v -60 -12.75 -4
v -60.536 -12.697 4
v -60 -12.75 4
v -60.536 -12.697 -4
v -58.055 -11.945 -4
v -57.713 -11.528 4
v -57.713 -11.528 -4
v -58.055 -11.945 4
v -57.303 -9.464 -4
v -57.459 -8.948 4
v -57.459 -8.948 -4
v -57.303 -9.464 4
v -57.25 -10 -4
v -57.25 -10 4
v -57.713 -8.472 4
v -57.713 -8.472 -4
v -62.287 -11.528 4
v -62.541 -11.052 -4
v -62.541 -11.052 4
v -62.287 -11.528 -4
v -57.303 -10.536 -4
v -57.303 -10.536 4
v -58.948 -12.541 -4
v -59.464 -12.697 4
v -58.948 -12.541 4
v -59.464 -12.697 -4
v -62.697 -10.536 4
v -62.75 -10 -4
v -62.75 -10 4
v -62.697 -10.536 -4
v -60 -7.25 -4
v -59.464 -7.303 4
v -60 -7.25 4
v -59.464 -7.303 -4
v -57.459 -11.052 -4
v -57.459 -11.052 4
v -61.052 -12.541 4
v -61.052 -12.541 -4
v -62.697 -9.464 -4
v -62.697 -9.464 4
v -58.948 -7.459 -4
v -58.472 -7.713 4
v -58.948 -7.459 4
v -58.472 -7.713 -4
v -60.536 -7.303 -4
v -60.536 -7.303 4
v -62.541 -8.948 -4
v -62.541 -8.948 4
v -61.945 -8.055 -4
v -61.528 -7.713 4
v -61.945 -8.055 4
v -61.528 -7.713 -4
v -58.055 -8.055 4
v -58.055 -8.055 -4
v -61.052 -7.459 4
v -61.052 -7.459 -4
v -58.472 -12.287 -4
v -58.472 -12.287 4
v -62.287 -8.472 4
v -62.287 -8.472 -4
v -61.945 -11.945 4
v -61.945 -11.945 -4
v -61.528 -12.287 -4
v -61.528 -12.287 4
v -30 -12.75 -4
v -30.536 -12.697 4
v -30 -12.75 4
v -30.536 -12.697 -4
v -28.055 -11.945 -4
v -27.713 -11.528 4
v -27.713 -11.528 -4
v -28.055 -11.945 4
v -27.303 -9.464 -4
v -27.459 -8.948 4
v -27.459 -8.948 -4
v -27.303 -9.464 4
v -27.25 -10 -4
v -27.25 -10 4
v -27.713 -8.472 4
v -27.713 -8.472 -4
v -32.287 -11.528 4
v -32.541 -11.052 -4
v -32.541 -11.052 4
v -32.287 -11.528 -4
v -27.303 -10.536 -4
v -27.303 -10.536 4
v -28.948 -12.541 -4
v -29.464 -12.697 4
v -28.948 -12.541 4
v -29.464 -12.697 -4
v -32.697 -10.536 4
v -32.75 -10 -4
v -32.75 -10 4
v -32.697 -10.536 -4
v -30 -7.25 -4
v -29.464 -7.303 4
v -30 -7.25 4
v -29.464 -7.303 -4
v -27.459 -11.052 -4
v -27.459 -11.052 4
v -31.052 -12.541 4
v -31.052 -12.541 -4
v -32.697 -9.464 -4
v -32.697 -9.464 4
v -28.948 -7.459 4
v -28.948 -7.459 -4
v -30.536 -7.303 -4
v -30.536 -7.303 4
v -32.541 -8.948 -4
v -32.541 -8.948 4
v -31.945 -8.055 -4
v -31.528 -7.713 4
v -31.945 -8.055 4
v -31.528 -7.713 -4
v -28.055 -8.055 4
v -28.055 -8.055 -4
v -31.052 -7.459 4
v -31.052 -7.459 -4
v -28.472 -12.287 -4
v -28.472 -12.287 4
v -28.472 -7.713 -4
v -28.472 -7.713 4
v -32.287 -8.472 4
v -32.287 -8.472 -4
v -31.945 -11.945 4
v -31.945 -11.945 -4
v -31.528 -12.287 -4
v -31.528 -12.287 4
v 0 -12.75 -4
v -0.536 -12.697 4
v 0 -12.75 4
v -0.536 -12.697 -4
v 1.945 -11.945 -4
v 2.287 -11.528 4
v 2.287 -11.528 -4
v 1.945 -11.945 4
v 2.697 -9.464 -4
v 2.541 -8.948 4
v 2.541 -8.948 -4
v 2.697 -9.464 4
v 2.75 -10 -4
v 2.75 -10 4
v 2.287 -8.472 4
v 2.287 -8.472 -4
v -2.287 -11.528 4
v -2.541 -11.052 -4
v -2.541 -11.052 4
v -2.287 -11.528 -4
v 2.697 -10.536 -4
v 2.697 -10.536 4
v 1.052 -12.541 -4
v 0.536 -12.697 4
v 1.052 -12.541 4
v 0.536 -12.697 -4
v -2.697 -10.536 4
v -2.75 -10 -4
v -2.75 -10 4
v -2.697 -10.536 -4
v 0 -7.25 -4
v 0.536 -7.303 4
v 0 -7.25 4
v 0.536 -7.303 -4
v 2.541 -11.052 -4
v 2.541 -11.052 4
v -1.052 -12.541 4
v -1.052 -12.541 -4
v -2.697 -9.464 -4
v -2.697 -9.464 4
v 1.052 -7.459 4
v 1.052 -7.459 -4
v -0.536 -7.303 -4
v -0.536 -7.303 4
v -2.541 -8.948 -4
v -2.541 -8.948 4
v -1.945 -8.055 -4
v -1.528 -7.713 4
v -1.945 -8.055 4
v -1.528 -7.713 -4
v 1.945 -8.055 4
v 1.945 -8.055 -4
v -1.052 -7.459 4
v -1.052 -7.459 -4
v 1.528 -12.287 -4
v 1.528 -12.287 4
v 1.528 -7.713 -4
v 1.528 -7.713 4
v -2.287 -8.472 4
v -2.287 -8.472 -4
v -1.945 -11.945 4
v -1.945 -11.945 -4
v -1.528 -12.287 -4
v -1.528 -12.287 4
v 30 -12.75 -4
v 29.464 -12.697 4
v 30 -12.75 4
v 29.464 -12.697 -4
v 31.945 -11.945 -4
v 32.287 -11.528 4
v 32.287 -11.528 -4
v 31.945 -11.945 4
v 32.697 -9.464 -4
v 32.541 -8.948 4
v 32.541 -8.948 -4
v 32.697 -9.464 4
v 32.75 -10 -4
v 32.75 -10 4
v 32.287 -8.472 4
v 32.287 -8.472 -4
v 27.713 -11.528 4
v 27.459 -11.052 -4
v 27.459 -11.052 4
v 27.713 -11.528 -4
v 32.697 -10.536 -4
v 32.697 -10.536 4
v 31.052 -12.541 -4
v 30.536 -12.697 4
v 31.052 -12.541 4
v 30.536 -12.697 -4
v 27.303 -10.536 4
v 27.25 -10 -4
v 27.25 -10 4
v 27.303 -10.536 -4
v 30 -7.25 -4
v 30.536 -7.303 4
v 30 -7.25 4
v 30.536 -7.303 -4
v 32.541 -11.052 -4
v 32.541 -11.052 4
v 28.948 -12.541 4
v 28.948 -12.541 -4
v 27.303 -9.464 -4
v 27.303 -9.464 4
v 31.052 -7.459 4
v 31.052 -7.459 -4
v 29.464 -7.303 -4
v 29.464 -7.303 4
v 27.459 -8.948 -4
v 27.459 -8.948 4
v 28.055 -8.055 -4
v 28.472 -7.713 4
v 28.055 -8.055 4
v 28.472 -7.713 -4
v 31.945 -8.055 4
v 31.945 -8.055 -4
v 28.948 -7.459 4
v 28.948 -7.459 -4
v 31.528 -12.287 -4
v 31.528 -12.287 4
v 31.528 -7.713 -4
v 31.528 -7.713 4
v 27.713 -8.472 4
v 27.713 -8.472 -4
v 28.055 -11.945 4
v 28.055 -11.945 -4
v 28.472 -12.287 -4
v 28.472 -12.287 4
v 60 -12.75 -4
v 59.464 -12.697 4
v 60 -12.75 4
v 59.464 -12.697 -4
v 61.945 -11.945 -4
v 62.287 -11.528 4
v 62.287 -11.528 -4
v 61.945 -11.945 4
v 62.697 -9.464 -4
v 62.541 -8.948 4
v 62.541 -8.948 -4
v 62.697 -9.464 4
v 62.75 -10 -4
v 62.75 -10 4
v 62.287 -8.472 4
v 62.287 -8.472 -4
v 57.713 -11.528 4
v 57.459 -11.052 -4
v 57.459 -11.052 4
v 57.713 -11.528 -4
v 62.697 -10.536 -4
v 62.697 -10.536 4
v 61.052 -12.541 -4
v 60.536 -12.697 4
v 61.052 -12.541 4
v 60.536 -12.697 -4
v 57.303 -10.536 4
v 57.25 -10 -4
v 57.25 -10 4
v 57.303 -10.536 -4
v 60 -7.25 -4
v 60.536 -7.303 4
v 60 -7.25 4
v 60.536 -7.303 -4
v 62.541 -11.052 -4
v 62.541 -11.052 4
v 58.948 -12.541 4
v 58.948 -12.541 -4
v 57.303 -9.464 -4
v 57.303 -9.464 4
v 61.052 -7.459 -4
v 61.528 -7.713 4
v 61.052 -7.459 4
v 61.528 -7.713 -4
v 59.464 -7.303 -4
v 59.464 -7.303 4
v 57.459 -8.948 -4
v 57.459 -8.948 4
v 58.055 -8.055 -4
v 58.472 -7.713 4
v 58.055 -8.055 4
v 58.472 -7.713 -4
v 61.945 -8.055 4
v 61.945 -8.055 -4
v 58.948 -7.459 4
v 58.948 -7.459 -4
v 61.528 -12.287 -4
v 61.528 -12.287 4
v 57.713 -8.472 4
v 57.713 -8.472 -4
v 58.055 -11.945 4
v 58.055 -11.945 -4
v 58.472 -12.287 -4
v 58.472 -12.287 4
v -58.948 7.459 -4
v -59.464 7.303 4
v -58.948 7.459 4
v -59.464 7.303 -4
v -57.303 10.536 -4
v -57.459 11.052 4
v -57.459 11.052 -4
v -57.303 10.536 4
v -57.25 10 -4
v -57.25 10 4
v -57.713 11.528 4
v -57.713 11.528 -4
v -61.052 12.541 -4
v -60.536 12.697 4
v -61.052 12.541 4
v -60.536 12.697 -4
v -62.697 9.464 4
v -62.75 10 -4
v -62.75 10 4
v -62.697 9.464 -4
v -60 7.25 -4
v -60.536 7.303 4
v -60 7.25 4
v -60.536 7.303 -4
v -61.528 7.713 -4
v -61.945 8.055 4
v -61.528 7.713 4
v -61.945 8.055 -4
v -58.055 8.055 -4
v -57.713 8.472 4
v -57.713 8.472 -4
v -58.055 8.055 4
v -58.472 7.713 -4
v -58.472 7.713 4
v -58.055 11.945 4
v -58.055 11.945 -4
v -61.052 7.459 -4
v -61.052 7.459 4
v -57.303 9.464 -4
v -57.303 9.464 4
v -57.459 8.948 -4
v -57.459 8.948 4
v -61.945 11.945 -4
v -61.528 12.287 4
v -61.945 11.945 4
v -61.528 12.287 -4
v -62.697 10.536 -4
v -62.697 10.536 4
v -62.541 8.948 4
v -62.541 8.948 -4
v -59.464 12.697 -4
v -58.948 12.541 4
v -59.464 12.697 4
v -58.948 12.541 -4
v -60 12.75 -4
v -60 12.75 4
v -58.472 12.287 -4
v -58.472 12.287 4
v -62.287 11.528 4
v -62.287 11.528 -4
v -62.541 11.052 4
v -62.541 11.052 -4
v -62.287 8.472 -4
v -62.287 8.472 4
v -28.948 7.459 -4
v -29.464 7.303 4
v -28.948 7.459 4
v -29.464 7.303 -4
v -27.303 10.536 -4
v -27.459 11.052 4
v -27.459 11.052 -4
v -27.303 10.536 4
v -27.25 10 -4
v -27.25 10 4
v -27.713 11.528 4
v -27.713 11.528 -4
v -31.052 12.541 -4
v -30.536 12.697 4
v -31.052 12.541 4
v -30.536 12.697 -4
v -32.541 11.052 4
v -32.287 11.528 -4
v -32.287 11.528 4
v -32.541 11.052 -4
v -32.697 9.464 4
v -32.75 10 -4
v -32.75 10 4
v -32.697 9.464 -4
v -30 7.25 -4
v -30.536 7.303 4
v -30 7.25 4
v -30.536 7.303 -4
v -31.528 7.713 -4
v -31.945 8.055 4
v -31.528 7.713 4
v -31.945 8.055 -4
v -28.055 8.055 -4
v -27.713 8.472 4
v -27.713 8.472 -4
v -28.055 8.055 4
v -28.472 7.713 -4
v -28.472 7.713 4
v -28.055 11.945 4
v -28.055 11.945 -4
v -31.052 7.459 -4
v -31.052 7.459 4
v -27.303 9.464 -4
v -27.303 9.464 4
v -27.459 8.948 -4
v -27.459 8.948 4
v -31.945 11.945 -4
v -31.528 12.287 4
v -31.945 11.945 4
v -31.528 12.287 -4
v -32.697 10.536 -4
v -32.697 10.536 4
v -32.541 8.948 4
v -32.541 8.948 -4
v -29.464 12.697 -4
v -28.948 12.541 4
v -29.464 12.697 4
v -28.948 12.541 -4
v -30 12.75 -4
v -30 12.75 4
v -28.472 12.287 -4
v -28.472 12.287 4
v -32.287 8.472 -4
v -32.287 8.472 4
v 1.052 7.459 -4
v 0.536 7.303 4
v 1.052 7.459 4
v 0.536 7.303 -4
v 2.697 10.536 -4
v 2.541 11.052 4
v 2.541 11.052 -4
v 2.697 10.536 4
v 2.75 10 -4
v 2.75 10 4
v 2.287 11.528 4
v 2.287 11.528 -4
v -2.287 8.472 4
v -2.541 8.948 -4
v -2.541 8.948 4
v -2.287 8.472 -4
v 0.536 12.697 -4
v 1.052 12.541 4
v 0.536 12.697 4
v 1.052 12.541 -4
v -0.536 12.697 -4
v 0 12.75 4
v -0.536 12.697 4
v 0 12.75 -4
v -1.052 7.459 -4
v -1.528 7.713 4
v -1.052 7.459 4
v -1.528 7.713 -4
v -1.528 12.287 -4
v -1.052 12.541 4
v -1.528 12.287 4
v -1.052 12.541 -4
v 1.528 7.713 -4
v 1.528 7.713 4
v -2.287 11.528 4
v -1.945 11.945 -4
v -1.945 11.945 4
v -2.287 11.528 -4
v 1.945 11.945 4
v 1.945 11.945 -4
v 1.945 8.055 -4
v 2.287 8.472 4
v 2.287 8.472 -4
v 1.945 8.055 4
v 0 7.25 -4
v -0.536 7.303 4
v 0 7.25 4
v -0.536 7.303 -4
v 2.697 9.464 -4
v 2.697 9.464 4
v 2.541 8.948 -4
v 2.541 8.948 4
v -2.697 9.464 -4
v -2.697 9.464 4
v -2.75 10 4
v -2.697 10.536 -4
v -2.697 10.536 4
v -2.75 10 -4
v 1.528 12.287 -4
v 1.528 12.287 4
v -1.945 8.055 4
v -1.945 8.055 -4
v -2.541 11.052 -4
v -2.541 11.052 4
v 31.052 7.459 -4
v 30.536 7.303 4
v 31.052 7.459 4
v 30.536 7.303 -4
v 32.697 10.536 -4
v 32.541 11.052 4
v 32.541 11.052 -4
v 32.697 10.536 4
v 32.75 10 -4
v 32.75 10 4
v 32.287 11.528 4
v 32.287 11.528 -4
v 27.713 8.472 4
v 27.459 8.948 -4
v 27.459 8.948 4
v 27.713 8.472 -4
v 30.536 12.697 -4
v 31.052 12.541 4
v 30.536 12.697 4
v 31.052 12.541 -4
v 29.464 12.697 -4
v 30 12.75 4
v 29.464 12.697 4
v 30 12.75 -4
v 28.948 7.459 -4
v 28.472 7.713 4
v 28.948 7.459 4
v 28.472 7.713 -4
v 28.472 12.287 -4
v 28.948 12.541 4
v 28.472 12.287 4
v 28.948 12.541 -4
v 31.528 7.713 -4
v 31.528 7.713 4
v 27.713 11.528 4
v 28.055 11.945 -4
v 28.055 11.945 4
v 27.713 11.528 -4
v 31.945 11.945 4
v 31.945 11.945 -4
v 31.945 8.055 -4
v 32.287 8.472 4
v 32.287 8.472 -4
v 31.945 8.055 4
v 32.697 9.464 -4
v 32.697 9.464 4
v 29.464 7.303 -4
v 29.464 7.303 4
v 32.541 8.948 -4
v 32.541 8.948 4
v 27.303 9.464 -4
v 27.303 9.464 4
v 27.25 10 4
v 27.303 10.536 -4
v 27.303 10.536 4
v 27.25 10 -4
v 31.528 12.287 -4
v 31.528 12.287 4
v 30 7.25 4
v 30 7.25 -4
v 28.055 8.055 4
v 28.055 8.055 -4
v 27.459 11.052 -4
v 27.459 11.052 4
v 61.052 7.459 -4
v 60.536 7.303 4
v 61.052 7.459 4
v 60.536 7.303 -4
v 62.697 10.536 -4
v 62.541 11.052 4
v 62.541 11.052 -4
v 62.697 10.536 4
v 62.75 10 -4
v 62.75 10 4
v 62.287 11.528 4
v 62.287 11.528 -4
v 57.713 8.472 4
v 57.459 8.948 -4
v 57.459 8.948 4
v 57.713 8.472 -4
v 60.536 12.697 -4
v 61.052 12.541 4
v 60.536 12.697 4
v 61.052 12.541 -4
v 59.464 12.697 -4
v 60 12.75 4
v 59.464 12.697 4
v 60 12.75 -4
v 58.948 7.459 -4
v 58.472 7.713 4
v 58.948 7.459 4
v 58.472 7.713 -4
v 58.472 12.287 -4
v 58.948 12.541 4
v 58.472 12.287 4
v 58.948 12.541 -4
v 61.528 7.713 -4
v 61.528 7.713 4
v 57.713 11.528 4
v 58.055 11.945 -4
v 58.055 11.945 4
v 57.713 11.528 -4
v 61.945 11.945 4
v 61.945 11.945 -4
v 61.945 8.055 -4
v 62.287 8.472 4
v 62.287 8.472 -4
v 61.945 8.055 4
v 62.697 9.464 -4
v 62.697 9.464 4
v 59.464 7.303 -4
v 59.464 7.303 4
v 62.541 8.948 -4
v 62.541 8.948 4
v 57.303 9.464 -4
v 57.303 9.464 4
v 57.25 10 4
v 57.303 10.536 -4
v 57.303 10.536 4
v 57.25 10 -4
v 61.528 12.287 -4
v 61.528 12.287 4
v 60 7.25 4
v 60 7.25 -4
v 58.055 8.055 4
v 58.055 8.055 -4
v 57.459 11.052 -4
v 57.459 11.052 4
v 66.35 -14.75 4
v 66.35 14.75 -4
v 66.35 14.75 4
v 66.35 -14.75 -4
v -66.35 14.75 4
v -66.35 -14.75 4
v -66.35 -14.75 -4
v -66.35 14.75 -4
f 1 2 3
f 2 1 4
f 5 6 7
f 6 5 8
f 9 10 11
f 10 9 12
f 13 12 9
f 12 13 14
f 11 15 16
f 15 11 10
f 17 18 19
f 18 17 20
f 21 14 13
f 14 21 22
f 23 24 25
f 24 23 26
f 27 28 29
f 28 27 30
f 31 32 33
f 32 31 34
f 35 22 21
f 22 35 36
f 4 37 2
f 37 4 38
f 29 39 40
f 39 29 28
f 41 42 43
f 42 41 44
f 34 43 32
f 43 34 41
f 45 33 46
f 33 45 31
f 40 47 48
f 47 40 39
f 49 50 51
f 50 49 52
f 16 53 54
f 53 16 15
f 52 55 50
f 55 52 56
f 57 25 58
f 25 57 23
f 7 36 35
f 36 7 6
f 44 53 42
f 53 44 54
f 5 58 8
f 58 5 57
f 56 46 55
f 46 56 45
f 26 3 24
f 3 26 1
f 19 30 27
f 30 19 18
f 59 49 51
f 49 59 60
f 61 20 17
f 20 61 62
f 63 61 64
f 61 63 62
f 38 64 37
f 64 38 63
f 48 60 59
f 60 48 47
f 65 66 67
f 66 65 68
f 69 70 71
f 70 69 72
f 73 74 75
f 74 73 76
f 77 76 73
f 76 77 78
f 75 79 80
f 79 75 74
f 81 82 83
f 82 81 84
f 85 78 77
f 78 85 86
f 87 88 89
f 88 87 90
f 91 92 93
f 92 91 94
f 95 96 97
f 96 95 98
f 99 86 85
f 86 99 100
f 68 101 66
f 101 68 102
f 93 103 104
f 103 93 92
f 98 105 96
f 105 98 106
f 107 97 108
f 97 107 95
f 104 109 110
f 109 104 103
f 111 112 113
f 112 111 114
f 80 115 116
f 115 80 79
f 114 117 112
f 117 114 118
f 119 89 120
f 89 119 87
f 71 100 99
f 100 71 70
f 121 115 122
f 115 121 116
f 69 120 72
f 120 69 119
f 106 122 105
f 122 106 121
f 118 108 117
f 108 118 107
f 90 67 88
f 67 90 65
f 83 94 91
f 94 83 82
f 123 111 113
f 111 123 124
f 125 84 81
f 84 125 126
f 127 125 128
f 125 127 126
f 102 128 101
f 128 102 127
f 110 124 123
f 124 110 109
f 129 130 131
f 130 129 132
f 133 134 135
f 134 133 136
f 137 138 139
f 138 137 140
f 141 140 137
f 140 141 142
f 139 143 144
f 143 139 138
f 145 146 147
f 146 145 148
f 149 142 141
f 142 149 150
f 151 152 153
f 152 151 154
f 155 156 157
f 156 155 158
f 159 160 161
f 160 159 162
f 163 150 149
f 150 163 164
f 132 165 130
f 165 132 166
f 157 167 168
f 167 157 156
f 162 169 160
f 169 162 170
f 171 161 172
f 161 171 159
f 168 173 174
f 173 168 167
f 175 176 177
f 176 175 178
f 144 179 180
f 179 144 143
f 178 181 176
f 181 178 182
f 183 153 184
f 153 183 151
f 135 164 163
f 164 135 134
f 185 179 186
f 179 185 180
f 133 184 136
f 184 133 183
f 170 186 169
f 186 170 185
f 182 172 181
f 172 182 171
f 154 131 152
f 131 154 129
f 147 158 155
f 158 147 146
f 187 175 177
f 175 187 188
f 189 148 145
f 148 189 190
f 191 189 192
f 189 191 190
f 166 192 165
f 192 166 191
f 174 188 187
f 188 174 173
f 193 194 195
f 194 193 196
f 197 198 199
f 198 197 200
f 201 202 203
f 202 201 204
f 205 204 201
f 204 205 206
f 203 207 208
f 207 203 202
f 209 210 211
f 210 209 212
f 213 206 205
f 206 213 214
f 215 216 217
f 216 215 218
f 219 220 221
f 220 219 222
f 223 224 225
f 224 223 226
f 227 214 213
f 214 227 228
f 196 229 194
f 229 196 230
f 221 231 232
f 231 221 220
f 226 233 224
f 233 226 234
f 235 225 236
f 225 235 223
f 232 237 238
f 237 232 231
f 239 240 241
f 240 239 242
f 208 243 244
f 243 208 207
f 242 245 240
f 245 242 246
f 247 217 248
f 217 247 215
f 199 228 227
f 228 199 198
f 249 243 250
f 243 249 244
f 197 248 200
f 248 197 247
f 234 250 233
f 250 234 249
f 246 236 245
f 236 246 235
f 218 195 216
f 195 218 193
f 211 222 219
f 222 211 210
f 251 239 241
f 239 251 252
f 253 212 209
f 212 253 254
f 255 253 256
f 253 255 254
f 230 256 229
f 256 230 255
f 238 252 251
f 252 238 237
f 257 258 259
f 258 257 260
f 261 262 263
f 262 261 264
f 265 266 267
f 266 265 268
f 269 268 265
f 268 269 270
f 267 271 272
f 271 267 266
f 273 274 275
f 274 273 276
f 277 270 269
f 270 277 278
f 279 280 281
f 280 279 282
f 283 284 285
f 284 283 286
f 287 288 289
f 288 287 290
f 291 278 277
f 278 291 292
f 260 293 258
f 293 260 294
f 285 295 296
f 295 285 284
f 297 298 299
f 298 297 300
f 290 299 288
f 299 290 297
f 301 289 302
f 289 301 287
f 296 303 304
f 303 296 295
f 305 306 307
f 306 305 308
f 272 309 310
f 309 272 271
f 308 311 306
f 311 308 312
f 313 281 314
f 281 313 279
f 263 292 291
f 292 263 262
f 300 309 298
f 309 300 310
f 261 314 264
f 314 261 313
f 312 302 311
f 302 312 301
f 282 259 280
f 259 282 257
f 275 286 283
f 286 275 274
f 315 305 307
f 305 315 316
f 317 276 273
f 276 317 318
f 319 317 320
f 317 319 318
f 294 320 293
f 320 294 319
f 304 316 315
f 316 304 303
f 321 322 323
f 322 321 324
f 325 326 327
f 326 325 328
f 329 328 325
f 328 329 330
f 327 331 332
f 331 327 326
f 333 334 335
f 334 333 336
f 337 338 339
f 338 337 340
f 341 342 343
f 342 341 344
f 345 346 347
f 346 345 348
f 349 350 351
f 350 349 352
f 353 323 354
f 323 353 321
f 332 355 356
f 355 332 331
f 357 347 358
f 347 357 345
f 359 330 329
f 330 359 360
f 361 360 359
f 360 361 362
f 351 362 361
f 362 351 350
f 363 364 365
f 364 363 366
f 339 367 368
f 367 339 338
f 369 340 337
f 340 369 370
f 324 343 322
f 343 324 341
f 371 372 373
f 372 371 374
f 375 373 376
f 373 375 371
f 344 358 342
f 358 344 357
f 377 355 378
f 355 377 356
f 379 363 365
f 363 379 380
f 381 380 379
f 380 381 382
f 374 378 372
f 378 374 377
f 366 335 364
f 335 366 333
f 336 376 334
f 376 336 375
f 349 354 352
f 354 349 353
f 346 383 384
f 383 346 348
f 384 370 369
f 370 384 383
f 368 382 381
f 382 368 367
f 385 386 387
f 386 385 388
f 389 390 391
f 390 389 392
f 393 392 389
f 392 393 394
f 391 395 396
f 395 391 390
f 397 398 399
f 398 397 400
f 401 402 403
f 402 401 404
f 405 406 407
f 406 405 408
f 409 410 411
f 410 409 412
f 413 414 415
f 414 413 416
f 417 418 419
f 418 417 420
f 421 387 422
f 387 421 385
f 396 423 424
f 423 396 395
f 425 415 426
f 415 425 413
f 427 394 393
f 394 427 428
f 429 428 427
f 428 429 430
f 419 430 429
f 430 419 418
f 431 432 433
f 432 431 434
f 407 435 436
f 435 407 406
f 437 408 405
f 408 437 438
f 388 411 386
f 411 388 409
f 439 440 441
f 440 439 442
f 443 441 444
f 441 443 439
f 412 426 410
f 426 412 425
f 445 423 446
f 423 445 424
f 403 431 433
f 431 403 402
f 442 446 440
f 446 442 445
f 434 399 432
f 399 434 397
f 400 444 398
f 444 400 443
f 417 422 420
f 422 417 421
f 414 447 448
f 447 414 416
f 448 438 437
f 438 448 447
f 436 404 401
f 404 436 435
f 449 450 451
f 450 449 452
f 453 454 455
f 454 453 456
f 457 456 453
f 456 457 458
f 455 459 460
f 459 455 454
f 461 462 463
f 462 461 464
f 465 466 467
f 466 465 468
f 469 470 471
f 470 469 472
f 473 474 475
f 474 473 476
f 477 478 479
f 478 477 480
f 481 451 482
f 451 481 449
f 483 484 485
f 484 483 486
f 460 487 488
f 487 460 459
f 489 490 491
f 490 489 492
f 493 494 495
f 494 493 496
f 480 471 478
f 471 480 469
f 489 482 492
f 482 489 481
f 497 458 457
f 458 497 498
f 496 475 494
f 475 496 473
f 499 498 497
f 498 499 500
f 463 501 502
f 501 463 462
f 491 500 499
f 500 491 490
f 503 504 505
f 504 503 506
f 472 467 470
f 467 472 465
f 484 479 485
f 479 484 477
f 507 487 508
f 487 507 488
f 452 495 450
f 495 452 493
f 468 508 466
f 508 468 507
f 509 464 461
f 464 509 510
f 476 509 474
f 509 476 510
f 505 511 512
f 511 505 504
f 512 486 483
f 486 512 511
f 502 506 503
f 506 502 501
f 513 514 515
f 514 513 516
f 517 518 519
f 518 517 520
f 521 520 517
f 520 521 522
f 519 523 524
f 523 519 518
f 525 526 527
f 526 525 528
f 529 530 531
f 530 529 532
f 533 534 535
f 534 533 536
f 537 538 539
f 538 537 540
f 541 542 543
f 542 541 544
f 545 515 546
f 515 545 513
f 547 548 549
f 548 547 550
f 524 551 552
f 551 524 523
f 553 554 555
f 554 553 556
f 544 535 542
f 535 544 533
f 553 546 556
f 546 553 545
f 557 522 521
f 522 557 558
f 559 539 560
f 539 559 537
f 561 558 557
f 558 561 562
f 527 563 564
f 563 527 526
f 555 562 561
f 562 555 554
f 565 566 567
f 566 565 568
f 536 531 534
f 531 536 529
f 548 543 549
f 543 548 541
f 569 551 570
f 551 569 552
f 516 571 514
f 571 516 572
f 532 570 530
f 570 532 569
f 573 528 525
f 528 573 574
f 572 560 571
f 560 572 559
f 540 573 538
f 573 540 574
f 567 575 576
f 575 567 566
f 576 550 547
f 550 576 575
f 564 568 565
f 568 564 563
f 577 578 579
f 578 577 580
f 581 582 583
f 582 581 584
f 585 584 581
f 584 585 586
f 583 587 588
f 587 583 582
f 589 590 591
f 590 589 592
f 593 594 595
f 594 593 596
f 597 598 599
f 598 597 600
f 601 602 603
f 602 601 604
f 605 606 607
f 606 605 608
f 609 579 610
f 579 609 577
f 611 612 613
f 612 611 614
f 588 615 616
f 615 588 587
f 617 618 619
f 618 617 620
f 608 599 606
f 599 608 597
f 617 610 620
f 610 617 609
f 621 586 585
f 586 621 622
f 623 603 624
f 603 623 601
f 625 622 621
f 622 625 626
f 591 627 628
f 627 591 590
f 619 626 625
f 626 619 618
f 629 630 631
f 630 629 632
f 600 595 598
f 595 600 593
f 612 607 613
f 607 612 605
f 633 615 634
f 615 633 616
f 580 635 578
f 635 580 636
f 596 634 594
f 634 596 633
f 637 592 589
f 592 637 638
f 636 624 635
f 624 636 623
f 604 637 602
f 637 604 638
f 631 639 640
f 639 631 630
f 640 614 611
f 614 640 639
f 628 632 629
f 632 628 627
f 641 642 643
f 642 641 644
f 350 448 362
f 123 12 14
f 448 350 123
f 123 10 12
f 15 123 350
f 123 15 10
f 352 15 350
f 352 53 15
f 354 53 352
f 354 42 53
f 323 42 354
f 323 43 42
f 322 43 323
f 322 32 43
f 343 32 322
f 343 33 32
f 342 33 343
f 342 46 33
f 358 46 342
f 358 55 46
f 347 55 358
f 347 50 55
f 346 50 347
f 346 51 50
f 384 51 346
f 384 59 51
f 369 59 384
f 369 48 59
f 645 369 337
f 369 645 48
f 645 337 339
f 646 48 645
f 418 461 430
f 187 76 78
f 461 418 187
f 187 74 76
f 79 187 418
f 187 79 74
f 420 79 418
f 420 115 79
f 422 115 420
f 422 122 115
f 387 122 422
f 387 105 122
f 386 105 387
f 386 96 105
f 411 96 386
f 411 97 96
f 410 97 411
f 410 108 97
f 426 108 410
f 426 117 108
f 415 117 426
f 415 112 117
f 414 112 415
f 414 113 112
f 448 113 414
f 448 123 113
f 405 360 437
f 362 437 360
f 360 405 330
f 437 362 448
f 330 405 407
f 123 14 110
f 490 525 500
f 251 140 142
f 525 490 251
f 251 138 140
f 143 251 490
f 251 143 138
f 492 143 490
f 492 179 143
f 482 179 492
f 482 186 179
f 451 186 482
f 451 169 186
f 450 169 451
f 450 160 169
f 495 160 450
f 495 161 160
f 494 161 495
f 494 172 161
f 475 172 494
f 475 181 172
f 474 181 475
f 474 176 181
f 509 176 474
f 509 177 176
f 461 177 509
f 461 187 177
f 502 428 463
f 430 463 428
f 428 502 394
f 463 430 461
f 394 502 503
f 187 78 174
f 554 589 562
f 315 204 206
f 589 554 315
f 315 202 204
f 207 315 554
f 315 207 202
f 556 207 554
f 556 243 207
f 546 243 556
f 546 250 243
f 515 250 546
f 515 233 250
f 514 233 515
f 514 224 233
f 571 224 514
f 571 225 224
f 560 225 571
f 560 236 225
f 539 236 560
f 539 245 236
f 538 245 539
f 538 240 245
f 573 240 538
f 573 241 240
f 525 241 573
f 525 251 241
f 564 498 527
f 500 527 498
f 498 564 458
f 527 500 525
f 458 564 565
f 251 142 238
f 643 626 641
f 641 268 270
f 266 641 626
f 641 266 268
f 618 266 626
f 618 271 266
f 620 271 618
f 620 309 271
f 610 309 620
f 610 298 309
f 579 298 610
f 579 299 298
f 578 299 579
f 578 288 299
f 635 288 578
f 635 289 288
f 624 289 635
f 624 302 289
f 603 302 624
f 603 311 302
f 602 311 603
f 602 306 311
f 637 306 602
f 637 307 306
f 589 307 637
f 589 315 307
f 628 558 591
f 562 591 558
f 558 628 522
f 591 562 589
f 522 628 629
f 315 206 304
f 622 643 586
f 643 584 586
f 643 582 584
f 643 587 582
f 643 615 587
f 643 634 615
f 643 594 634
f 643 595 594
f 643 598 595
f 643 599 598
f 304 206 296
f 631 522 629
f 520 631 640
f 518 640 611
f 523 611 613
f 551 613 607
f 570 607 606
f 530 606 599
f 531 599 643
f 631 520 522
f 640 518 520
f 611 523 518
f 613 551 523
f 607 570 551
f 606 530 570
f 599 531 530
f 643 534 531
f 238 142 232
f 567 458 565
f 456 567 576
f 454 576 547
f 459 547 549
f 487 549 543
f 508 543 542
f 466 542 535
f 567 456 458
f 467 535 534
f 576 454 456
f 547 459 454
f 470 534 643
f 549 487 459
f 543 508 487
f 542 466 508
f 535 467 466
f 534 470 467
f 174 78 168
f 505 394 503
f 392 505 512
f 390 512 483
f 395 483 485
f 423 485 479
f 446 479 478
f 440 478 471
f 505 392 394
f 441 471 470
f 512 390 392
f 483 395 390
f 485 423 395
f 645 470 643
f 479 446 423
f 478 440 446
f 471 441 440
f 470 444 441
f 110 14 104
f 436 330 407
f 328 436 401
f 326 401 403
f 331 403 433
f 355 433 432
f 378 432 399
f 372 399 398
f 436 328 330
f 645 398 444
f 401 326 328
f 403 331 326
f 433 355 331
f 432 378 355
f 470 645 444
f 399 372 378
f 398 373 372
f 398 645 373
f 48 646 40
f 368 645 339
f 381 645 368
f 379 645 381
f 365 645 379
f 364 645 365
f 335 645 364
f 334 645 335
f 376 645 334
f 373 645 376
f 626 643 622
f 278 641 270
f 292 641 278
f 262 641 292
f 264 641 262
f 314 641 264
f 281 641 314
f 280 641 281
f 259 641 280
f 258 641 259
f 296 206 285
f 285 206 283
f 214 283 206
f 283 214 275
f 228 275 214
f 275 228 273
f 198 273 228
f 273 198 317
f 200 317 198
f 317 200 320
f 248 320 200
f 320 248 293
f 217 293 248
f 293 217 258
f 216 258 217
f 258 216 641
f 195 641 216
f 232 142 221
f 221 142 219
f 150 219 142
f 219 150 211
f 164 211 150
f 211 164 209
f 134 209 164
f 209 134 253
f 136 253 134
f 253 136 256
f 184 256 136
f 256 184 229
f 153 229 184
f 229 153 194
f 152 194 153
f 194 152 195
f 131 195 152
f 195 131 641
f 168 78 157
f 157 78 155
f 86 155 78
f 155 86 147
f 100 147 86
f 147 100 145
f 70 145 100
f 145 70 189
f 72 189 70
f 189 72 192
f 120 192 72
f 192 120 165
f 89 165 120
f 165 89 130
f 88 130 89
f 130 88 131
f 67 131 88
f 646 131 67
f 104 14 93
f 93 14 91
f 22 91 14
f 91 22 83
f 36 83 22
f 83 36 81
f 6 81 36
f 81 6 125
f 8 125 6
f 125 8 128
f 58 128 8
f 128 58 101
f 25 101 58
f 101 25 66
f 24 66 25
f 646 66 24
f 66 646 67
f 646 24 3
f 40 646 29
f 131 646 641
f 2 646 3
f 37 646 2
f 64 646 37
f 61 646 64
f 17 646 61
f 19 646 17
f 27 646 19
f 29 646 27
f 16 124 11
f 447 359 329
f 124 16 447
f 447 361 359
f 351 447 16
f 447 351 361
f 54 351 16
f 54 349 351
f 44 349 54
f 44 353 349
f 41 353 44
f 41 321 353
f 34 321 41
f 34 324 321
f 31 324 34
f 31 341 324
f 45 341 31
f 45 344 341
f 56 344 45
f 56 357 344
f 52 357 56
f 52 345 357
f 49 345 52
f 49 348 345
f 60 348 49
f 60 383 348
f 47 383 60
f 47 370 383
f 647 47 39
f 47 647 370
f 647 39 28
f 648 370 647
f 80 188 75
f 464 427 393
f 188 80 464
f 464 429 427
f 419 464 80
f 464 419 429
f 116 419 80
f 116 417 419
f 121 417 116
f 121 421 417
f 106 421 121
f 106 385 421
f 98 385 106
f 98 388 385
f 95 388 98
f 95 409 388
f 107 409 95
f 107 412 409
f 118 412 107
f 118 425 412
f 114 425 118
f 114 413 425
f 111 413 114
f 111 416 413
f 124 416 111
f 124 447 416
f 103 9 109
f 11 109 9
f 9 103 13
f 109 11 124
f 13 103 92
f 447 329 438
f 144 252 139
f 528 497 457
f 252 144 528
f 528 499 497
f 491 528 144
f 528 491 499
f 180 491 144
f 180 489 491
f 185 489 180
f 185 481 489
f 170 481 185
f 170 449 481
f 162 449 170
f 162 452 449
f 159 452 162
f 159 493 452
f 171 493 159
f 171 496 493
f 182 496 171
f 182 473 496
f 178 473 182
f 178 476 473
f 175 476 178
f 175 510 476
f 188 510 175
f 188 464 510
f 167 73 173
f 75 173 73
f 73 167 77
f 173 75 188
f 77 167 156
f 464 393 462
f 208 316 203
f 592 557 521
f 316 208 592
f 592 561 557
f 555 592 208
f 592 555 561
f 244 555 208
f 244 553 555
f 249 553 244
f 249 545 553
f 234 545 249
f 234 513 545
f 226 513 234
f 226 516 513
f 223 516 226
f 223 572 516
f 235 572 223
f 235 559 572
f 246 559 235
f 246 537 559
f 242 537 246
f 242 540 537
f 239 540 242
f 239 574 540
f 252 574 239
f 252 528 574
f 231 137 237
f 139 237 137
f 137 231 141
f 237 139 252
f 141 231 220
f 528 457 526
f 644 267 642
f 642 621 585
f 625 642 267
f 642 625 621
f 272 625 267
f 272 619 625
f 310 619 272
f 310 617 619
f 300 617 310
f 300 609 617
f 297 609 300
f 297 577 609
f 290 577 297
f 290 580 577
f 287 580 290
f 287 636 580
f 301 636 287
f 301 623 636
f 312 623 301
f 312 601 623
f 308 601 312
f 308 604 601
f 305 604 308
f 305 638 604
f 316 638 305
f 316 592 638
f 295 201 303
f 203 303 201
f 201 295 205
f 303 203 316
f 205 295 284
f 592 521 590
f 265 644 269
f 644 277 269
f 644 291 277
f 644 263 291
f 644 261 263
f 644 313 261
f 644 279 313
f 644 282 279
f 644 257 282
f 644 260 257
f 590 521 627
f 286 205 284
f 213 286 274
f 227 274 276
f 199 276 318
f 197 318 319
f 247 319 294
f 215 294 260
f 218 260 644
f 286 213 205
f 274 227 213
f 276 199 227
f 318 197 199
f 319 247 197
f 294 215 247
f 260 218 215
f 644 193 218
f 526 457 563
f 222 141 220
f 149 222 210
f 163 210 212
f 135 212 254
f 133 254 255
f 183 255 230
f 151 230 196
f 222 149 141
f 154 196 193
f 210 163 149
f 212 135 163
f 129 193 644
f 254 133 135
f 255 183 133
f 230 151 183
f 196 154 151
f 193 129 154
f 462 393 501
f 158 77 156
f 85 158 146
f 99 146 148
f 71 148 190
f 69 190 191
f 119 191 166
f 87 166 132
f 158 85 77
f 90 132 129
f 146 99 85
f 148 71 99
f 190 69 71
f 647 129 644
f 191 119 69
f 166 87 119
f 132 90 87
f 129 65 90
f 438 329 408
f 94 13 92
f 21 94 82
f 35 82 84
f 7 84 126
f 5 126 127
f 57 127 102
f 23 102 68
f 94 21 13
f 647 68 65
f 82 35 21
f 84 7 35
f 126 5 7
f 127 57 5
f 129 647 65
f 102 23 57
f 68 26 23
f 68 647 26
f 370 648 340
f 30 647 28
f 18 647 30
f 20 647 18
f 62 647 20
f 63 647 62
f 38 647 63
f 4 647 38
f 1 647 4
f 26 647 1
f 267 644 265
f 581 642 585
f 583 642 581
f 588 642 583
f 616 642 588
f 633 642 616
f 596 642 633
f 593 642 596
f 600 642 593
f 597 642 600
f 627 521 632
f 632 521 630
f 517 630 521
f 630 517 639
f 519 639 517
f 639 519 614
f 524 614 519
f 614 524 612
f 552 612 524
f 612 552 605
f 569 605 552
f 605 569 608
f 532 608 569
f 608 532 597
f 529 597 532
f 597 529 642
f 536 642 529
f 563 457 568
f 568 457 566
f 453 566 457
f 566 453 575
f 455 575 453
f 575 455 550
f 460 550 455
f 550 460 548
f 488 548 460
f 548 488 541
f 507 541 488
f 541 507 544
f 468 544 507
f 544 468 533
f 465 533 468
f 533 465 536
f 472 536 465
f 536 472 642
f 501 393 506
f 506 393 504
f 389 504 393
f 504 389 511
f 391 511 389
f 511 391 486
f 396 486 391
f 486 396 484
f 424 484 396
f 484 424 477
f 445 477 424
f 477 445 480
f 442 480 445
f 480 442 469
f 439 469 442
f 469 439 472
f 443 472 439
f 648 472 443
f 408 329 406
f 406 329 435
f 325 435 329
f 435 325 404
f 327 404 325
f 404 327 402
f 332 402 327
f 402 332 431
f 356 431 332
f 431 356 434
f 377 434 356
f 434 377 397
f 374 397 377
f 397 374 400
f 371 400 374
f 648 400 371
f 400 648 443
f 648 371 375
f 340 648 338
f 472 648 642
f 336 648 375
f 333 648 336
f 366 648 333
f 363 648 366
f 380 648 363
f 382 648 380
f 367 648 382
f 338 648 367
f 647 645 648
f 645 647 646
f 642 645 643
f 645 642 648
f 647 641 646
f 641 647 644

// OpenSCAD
$fn = 32;

// ----------------------------------------------------------------------
// Hole bar, 5 x Ø5.5
// tworows layout, 6.35 mm edge offset
// ----------------------------------------------------------------------

// --- parameters (mm) ---
bar_w = 29.5;     // bar width (Y)
bar_t = 8;        // bar thickness (Z)
holes = 5;        // holes per row
hole_d = 5.5;     // hole diameter
edge = 6.35;      // offset from the bar end to the first hole
pitch = 30;       // pitch between neighbouring holes
row_offset = 20;  // distance between the two rows

// --- derived feature positions (mm) ---
span = (holes - 1) * pitch;   // = 120   distance between the end holes
bar_l = span + 2 * edge;      // = 132.7   overall bar length
start_x = -bar_l / 2 + edge;  // = -60   X of the first hole
feature_centers = [
  [start_x + 0 * pitch, -row_offset / 2],
  [start_x + 1 * pitch, -row_offset / 2],
  [start_x + 2 * pitch, -row_offset / 2],
  [start_x + 3 * pitch, -row_offset / 2],
  [start_x + 4 * pitch, -row_offset / 2]
];   // hole centres of the first row
row2_centers = [
  [start_x + 0 * pitch, row_offset / 2],
  [start_x + 1 * pitch, row_offset / 2],
  [start_x + 2 * pitch, row_offset / 2],
  [start_x + 3 * pitch, row_offset / 2],
  [start_x + 4 * pitch, row_offset / 2]
];   // hole centres of the second row

// bar with two rows of holes, both read from their own centre arrays
difference() {
  translate([-bar_l / 2, -bar_w / 2, -bar_t / 2]) cube([bar_l, bar_w, bar_t]);
  for (centre = feature_centers)
    translate([centre[0], centre[1], 0])
      cylinder(d = hole_d, h = bar_t + 2, center = true);
  for (centre = row2_centers)
    translate([centre[0], centre[1], 0])
      cylinder(d = hole_d, h = bar_t + 2, center = true);
}
